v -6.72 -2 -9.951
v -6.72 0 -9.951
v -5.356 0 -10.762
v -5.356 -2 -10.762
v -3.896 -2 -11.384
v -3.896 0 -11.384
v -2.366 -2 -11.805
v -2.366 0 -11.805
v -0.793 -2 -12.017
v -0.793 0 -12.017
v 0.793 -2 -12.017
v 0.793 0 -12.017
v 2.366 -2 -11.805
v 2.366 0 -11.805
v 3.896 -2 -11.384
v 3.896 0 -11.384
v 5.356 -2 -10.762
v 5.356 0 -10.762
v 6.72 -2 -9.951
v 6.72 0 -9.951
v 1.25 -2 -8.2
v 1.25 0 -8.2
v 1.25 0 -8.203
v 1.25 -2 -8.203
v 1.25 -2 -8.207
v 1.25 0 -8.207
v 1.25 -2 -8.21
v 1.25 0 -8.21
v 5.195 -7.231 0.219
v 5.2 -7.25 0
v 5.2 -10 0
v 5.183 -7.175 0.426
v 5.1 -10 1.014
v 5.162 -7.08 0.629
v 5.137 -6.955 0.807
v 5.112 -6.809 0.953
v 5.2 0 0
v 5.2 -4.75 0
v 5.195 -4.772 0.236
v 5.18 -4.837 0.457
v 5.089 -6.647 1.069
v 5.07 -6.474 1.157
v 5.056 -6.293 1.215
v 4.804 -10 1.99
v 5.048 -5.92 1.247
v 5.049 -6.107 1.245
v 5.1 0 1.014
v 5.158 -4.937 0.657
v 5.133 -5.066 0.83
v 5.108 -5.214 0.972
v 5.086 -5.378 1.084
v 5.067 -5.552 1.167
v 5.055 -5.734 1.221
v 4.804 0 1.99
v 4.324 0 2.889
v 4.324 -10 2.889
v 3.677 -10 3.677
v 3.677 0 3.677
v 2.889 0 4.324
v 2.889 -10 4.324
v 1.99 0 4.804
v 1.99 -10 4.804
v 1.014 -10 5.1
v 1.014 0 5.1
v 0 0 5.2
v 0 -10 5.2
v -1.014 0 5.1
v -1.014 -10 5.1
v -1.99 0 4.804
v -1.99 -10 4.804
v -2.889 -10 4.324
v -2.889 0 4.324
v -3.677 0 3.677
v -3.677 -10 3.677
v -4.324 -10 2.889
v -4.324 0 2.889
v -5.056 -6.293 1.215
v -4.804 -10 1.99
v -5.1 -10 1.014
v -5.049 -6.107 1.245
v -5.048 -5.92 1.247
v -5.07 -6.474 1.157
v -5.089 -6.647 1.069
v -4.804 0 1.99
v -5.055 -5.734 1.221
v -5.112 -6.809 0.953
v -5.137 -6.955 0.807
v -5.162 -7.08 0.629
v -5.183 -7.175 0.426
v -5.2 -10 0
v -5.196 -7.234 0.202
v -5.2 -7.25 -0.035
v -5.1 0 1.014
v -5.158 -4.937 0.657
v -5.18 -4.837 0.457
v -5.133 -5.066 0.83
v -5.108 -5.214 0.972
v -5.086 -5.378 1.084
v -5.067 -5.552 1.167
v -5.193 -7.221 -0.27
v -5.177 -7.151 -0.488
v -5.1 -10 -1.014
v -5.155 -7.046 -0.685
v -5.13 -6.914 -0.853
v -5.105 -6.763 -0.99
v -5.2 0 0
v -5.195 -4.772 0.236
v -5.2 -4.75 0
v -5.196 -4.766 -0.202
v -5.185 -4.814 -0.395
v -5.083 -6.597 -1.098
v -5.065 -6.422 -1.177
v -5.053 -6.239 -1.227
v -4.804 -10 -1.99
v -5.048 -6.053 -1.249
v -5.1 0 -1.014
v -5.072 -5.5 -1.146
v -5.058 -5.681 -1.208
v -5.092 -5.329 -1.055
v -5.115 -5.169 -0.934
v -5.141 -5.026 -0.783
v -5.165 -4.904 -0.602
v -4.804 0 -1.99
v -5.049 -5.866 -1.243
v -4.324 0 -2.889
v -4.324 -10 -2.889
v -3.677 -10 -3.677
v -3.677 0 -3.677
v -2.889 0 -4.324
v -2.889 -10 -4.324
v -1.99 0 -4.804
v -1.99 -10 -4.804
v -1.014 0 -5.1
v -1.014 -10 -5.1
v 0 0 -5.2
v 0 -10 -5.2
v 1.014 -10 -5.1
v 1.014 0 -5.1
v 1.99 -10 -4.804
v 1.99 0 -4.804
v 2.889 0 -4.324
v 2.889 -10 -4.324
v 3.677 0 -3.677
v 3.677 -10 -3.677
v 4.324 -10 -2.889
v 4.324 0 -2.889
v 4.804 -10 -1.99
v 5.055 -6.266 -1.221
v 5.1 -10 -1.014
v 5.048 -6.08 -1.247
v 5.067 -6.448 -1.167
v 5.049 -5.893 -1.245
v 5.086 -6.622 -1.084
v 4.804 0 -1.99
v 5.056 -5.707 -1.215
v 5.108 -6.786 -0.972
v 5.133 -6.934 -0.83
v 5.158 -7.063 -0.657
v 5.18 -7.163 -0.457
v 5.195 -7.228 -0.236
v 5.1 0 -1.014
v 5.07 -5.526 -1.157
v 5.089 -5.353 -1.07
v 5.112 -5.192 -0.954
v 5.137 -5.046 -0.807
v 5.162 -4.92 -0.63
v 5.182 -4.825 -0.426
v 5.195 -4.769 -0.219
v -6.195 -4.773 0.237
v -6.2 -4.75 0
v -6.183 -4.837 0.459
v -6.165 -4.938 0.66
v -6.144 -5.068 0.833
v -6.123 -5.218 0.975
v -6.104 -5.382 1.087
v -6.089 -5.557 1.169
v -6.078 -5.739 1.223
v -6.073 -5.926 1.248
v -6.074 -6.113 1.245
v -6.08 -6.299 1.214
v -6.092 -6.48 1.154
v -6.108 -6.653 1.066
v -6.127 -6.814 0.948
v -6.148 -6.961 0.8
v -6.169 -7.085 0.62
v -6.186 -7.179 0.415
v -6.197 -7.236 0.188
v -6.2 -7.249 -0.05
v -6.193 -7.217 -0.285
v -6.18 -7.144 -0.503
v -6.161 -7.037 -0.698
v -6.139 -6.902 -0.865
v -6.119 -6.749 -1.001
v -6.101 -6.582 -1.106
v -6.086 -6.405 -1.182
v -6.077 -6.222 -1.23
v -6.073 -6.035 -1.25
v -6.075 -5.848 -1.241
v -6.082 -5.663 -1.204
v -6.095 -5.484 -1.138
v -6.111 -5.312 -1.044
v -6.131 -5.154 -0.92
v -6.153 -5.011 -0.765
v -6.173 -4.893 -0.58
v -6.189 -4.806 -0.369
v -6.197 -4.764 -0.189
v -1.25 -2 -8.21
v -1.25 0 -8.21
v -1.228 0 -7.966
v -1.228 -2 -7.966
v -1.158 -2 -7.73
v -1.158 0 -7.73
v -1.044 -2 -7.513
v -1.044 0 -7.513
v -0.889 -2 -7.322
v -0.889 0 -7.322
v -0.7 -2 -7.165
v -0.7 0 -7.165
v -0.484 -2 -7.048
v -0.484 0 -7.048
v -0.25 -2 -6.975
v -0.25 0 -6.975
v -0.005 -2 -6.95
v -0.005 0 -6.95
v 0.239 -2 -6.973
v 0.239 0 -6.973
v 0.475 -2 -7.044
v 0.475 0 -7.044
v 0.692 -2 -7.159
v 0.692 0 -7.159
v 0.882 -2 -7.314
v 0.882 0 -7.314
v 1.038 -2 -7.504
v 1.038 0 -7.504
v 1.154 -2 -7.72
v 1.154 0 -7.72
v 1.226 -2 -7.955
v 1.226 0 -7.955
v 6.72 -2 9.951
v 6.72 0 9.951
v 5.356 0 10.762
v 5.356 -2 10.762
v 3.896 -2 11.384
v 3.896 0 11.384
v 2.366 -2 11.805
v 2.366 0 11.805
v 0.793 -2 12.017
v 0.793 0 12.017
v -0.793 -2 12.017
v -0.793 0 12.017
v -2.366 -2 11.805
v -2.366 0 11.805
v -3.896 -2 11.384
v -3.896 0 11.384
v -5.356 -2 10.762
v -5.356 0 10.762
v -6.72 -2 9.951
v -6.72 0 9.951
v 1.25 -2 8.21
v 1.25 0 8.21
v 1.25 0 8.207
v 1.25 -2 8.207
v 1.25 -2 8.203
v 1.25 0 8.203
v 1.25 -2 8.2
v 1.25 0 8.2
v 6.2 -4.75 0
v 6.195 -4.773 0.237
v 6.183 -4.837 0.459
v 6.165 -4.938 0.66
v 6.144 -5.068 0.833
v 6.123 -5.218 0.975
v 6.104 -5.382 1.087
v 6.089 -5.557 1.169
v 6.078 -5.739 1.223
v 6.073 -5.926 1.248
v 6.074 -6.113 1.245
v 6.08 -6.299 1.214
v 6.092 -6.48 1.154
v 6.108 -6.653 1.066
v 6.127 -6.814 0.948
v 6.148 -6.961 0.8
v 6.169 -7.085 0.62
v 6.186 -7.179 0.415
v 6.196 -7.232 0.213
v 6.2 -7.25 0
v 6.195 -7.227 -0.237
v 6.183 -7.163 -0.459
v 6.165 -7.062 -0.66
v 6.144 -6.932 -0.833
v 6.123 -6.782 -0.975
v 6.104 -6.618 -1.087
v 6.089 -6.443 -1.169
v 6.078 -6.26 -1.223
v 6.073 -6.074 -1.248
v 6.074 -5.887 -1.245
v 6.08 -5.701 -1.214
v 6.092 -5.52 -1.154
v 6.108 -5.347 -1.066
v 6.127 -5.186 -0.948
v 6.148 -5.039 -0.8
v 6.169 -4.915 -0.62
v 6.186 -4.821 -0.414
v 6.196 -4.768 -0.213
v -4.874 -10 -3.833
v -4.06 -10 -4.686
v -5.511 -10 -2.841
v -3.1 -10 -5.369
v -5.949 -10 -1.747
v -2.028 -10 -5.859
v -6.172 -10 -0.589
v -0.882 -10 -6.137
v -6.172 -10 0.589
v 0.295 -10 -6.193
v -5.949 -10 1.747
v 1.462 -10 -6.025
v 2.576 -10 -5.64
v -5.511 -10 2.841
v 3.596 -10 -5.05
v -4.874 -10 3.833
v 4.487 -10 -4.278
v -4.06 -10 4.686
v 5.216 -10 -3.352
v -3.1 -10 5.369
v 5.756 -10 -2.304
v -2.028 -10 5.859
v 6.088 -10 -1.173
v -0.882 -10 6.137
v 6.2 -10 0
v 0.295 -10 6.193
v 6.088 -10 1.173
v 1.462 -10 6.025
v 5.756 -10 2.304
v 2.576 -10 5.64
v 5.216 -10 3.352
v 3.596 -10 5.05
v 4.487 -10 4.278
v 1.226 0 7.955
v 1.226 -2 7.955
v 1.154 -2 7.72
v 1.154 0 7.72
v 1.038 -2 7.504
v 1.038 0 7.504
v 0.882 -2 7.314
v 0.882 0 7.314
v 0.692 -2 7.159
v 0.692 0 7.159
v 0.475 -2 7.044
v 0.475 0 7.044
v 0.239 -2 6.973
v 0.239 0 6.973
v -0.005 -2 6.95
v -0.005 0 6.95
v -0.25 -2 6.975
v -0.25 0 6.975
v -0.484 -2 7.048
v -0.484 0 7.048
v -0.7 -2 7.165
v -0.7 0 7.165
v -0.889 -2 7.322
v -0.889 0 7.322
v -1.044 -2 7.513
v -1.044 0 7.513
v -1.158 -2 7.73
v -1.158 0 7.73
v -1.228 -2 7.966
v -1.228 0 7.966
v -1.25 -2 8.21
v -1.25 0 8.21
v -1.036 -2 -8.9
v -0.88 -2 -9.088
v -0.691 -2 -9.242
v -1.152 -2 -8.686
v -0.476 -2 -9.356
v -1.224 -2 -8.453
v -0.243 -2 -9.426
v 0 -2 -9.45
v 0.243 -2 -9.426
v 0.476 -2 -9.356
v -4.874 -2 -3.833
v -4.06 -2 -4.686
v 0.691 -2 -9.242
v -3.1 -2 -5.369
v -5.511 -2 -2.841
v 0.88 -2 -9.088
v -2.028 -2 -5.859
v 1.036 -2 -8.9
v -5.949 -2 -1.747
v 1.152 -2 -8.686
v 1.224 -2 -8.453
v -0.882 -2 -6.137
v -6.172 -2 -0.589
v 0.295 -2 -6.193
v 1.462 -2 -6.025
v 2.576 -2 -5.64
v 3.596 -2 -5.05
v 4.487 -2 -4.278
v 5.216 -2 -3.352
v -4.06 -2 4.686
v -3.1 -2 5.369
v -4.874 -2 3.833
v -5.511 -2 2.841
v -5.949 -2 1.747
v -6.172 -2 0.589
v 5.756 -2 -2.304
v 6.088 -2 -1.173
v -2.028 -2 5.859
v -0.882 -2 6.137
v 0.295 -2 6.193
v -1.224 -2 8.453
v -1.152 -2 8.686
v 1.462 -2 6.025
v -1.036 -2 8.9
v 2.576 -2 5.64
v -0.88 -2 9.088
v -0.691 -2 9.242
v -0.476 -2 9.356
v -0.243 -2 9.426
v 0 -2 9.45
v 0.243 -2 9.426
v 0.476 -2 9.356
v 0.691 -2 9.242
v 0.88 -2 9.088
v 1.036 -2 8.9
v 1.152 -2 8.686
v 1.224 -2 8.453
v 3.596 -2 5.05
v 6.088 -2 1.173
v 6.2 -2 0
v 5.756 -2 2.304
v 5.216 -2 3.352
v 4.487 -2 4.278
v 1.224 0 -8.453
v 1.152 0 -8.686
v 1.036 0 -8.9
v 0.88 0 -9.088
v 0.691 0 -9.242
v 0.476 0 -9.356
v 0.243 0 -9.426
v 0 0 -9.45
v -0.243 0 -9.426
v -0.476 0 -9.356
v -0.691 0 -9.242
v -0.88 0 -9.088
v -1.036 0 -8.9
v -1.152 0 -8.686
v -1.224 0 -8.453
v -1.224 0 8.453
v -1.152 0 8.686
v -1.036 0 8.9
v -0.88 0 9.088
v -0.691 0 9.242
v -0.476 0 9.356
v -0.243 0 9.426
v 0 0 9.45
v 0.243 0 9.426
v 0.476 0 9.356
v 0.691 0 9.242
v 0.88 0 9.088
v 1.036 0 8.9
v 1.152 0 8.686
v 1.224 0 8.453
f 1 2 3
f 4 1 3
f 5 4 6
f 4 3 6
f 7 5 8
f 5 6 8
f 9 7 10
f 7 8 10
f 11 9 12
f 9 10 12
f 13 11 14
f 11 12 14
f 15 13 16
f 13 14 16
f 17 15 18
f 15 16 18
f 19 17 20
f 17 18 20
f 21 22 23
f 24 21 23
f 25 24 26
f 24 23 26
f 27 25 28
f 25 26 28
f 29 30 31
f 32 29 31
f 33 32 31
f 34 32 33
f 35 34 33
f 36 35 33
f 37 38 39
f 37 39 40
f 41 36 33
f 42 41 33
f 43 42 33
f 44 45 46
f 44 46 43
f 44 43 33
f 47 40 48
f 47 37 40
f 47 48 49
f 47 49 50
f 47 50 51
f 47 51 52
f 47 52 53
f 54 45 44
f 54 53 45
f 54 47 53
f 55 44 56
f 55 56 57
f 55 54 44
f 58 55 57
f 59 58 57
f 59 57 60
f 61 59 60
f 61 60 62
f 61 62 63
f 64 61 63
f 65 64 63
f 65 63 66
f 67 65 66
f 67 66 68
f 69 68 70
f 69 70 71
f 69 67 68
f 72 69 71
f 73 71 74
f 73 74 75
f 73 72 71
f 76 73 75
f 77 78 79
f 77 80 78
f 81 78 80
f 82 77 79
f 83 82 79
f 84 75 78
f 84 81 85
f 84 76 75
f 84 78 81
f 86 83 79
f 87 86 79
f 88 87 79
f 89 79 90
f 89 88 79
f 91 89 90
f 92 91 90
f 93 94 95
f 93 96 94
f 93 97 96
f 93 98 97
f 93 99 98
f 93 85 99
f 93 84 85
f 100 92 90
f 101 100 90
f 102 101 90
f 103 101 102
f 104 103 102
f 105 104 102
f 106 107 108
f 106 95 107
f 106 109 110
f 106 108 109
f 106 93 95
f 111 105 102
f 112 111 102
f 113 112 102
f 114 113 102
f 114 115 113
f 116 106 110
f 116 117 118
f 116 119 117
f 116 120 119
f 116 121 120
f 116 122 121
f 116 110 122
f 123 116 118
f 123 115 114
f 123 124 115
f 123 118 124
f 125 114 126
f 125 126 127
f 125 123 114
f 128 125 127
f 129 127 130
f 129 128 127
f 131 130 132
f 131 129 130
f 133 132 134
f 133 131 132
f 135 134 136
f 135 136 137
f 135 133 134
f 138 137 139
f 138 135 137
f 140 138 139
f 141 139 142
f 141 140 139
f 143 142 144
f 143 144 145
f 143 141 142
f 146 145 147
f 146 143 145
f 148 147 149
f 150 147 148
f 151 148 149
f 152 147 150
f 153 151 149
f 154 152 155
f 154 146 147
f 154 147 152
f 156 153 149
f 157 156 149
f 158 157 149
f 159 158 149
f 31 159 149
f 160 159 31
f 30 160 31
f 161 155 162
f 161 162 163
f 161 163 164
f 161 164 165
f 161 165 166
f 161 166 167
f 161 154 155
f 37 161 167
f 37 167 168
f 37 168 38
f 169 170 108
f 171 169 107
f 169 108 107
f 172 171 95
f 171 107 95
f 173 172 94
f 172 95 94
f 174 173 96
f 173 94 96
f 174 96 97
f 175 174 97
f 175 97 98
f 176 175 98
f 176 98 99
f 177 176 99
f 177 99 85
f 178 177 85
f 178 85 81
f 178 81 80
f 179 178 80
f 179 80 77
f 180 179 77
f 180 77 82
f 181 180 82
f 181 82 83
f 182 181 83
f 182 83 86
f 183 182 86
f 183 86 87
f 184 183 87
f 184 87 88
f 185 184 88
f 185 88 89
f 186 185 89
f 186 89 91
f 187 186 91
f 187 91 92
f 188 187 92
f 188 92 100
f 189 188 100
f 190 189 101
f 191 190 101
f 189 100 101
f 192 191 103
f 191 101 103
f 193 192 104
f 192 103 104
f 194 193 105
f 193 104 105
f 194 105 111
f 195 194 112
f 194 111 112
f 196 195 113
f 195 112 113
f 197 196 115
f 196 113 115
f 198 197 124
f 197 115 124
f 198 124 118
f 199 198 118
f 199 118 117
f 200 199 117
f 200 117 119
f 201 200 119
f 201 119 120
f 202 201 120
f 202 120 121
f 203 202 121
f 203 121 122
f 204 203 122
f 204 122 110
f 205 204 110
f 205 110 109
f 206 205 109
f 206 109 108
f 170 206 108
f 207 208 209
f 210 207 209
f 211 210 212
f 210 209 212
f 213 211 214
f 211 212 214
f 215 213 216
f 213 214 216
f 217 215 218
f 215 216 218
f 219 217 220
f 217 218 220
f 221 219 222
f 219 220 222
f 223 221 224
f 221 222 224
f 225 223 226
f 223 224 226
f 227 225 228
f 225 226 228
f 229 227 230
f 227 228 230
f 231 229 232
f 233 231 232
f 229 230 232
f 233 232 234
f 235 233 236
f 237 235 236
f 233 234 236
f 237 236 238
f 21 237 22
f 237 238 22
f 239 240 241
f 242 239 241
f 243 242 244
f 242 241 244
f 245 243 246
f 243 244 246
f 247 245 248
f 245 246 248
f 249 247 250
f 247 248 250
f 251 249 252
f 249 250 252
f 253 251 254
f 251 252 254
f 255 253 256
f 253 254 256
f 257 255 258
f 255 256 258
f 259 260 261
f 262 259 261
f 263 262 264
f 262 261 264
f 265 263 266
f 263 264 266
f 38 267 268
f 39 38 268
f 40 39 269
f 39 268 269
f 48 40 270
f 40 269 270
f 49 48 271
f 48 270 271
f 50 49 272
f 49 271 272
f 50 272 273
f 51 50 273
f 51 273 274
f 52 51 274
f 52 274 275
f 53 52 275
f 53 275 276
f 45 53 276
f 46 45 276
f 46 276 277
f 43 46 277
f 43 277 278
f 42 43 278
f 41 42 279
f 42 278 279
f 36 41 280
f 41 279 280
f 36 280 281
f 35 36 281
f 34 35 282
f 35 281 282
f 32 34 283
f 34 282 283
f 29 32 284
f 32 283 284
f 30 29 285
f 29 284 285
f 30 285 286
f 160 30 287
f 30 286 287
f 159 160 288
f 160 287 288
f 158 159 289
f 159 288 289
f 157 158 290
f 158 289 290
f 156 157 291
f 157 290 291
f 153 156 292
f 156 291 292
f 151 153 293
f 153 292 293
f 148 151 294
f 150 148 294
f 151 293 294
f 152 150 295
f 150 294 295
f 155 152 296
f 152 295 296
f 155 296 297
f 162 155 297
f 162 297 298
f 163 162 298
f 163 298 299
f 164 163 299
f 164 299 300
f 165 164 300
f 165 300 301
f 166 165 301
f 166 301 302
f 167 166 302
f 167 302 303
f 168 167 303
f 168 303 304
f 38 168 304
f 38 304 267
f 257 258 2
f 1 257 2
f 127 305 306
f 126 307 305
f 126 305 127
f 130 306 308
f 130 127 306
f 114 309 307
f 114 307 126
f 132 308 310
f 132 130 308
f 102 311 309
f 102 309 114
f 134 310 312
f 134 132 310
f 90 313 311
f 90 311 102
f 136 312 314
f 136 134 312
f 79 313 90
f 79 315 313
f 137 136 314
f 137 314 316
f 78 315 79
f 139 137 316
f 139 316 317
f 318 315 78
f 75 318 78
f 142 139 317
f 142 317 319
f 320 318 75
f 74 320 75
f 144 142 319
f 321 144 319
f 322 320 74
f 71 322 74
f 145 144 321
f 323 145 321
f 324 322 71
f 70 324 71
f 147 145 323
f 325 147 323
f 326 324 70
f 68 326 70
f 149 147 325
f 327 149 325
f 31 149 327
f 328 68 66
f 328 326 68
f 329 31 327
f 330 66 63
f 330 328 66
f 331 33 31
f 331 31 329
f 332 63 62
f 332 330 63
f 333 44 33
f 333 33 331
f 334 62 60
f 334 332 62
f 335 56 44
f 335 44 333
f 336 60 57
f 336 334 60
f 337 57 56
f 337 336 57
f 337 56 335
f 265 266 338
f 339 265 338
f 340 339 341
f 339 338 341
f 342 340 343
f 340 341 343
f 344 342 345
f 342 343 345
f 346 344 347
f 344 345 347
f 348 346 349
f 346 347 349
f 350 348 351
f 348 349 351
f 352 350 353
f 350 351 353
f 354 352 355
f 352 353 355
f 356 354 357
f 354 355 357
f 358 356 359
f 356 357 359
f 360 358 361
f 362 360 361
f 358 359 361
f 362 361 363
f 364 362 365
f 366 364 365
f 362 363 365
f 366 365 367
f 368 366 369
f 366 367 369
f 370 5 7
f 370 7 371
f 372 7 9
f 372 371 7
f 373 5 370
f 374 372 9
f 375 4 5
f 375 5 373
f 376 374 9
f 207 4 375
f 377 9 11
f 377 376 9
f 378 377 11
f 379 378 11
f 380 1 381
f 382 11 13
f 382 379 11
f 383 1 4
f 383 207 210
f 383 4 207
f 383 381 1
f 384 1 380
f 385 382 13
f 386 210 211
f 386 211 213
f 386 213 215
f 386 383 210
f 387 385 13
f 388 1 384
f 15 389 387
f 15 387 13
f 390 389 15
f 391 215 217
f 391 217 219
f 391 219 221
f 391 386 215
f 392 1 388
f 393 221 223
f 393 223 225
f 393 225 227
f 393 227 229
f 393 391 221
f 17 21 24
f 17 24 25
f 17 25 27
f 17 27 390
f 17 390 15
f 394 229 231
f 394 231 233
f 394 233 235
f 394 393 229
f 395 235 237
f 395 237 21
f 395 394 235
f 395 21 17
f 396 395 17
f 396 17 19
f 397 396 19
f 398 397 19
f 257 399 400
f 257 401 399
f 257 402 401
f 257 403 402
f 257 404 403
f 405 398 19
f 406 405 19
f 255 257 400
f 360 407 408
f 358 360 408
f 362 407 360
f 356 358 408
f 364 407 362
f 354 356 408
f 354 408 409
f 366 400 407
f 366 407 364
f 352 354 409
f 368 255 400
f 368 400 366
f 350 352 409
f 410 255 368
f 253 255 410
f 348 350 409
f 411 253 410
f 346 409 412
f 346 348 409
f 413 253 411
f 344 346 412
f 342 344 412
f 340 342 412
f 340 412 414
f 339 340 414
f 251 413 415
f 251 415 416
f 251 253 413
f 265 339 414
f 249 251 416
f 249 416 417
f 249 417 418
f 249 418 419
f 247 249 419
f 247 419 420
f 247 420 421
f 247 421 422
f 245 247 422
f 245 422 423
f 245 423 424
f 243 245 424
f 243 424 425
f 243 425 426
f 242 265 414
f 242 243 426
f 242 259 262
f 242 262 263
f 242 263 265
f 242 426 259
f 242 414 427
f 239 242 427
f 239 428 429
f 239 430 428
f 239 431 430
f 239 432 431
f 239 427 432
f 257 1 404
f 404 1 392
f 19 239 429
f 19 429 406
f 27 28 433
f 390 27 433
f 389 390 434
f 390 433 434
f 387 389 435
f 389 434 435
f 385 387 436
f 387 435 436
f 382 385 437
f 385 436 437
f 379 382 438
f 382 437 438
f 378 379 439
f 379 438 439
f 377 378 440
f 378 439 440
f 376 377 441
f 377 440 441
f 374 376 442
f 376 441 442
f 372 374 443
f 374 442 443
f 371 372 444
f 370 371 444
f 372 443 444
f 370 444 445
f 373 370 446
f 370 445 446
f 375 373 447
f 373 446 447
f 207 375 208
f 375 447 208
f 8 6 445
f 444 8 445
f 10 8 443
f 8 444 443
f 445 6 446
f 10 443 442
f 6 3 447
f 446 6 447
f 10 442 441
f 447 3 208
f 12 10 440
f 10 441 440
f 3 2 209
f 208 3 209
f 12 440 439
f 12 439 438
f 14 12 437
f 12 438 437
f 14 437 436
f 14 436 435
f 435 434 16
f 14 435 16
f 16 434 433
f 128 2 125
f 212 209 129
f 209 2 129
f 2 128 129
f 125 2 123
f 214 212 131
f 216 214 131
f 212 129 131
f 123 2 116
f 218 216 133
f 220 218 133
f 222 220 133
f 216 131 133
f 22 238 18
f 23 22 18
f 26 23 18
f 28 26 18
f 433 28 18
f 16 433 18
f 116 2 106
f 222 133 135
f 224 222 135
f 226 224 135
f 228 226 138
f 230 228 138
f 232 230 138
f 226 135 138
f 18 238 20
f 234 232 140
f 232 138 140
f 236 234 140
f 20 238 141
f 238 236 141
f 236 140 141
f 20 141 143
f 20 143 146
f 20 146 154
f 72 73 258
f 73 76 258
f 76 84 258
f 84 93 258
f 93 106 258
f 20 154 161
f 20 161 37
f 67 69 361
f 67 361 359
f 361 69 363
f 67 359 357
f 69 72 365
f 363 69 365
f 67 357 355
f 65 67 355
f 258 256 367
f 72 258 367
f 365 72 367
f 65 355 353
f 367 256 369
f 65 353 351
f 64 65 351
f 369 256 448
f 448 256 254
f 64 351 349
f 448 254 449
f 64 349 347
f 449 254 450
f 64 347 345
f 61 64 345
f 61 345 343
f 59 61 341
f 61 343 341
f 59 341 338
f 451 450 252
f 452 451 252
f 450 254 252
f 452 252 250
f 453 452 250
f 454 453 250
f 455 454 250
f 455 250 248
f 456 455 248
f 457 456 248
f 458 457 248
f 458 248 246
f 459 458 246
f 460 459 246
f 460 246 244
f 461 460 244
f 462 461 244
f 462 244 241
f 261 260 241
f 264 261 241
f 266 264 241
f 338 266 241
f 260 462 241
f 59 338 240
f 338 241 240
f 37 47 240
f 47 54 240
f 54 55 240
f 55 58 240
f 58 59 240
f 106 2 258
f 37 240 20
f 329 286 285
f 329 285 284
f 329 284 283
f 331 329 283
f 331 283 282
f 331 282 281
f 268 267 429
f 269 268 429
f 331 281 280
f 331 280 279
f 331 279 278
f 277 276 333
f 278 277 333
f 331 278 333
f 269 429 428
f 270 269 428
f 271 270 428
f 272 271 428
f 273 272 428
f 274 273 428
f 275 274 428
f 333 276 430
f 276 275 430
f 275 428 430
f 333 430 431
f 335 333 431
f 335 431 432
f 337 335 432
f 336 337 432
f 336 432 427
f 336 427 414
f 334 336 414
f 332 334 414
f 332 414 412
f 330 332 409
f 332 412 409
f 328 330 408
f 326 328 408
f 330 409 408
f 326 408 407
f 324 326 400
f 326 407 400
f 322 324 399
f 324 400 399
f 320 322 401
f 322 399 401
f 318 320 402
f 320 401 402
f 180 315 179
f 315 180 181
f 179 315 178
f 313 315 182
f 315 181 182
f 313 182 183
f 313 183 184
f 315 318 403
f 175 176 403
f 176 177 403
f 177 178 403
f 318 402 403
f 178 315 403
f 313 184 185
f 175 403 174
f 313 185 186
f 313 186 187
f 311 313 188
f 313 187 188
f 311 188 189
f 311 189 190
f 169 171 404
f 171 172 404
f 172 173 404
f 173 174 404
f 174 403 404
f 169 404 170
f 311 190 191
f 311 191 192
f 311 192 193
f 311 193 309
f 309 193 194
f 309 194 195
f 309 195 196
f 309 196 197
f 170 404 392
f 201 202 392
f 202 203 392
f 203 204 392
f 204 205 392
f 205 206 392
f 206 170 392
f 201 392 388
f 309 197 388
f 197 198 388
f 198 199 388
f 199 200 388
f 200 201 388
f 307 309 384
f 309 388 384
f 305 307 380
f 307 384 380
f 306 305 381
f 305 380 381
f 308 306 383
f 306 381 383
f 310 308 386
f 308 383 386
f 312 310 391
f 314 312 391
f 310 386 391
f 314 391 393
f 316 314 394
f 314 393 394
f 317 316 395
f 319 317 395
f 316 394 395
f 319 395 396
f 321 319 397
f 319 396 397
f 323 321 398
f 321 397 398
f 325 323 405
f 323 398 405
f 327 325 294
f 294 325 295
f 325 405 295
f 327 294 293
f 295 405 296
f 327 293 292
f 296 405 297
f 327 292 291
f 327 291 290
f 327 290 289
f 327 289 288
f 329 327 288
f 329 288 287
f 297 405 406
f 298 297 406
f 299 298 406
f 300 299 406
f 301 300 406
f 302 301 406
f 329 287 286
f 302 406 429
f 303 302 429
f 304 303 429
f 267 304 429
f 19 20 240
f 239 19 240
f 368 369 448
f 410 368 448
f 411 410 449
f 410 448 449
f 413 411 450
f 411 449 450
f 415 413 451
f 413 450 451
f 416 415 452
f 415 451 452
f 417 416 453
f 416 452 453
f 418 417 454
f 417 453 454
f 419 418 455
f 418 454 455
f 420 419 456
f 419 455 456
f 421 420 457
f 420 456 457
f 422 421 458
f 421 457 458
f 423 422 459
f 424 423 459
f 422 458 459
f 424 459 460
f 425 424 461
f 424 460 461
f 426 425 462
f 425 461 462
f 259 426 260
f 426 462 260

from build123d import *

# Parameters (mm, degrees)
F0_R     = 6.2
F1_DEPTH = 2
F0_R_2   = 5.2
F2_DEPTH = 10
F3_R     = 1.25
F4_DEPTH = 15


with BuildPart() as f1:
    # F0 (on Front) → F1 (new body)
    with BuildSketch(Plane.XZ):
        with BuildLine():
            Line((1.2499564027, -8.2104398957), (6.7196736159, -8.2104398957))
            Line((6.7196736159, -8.2104398957), (6.7196736159, 8.2104398957))
            Line((6.7196736159, 8.2104398957), (1.2499564027, 8.2104398957))
            ThreePointArc((1.2499564027, 8.2104398957), (1.2499891006, 8.2052199934), (1.25, 8.2))
            ThreePointArc((1.25, 8.2), (-0.0052199934, 6.9500108994), (-1.2499564027, 8.2104398957))
            Line((-1.2499564027, 8.2104398957), (-6.7196736159, 8.2104398957))
            Line((-6.7196736159, 8.2104398957), (-6.7196736159, -8.2104398957))
            Line((-6.7196736159, -8.2104398957), (-1.2499564027, -8.2104398957))
            ThreePointArc((-1.2499564027, -8.2104398957), (-0.0052199934, -6.9500108994), (1.25, -8.2))
            ThreePointArc((1.25, -8.2), (1.2499891006, -8.2052199934), (1.2499564027, -8.2104398957))
        make_face()
        Circle(F0_R, mode=Mode.SUBTRACT)
        with BuildLine():
            Line((1.2499564027, 8.2104398957), (6.7196736159, 8.2104398957))
            Line((6.7196736159, 8.2104398957), (6.7196736159, 9.95100941))
            ThreePointArc((6.7196736159, 9.95100941), (0, 12.0439815451), (-6.7196736159, 9.95100941))
            Line((-6.7196736159, 9.95100941), (-6.7196736159, 8.2104398957))
            Line((-6.7196736159, 8.2104398957), (-1.2499564027, 8.2104398957))
            ThreePointArc((-1.2499564027, 8.2104398957), (0, 9.45), (1.2499564027, 8.2104398957))
        make_face()
        with BuildLine():
            Line((6.7196736159, -9.95100941), (6.7196736159, -8.2104398957))
            Line((6.7196736159, -8.2104398957), (1.2499564027, -8.2104398957))
            ThreePointArc((1.2499564027, -8.2104398957), (0, -9.45), (-1.2499564027, -8.2104398957))
            Line((-1.2499564027, -8.2104398957), (-6.7196736159, -8.2104398957))
            Line((-6.7196736159, -8.2104398957), (-6.7196736159, -9.95100941))
            ThreePointArc((-6.7196736159, -9.95100941), (0, -12.0439815451), (6.7196736159, -9.95100941))
        make_face()
    extrude(amount=F1_DEPTH)

    # F0 (on Front) → F2 (join)
    with BuildSketch(Plane.XZ):
        Circle(F0_R)
        Circle(F0_R_2, mode=Mode.SUBTRACT)
    extrude(amount=F2_DEPTH)

    # F3 (on face) → F4 (cut)
    with BuildSketch(Plane.YZ.offset(6.7196736159)):
        with Locations((-6, 0)):
            Circle(F3_R)
    extrude(amount=-F4_DEPTH, mode=Mode.SUBTRACT)


solid = f1.part
